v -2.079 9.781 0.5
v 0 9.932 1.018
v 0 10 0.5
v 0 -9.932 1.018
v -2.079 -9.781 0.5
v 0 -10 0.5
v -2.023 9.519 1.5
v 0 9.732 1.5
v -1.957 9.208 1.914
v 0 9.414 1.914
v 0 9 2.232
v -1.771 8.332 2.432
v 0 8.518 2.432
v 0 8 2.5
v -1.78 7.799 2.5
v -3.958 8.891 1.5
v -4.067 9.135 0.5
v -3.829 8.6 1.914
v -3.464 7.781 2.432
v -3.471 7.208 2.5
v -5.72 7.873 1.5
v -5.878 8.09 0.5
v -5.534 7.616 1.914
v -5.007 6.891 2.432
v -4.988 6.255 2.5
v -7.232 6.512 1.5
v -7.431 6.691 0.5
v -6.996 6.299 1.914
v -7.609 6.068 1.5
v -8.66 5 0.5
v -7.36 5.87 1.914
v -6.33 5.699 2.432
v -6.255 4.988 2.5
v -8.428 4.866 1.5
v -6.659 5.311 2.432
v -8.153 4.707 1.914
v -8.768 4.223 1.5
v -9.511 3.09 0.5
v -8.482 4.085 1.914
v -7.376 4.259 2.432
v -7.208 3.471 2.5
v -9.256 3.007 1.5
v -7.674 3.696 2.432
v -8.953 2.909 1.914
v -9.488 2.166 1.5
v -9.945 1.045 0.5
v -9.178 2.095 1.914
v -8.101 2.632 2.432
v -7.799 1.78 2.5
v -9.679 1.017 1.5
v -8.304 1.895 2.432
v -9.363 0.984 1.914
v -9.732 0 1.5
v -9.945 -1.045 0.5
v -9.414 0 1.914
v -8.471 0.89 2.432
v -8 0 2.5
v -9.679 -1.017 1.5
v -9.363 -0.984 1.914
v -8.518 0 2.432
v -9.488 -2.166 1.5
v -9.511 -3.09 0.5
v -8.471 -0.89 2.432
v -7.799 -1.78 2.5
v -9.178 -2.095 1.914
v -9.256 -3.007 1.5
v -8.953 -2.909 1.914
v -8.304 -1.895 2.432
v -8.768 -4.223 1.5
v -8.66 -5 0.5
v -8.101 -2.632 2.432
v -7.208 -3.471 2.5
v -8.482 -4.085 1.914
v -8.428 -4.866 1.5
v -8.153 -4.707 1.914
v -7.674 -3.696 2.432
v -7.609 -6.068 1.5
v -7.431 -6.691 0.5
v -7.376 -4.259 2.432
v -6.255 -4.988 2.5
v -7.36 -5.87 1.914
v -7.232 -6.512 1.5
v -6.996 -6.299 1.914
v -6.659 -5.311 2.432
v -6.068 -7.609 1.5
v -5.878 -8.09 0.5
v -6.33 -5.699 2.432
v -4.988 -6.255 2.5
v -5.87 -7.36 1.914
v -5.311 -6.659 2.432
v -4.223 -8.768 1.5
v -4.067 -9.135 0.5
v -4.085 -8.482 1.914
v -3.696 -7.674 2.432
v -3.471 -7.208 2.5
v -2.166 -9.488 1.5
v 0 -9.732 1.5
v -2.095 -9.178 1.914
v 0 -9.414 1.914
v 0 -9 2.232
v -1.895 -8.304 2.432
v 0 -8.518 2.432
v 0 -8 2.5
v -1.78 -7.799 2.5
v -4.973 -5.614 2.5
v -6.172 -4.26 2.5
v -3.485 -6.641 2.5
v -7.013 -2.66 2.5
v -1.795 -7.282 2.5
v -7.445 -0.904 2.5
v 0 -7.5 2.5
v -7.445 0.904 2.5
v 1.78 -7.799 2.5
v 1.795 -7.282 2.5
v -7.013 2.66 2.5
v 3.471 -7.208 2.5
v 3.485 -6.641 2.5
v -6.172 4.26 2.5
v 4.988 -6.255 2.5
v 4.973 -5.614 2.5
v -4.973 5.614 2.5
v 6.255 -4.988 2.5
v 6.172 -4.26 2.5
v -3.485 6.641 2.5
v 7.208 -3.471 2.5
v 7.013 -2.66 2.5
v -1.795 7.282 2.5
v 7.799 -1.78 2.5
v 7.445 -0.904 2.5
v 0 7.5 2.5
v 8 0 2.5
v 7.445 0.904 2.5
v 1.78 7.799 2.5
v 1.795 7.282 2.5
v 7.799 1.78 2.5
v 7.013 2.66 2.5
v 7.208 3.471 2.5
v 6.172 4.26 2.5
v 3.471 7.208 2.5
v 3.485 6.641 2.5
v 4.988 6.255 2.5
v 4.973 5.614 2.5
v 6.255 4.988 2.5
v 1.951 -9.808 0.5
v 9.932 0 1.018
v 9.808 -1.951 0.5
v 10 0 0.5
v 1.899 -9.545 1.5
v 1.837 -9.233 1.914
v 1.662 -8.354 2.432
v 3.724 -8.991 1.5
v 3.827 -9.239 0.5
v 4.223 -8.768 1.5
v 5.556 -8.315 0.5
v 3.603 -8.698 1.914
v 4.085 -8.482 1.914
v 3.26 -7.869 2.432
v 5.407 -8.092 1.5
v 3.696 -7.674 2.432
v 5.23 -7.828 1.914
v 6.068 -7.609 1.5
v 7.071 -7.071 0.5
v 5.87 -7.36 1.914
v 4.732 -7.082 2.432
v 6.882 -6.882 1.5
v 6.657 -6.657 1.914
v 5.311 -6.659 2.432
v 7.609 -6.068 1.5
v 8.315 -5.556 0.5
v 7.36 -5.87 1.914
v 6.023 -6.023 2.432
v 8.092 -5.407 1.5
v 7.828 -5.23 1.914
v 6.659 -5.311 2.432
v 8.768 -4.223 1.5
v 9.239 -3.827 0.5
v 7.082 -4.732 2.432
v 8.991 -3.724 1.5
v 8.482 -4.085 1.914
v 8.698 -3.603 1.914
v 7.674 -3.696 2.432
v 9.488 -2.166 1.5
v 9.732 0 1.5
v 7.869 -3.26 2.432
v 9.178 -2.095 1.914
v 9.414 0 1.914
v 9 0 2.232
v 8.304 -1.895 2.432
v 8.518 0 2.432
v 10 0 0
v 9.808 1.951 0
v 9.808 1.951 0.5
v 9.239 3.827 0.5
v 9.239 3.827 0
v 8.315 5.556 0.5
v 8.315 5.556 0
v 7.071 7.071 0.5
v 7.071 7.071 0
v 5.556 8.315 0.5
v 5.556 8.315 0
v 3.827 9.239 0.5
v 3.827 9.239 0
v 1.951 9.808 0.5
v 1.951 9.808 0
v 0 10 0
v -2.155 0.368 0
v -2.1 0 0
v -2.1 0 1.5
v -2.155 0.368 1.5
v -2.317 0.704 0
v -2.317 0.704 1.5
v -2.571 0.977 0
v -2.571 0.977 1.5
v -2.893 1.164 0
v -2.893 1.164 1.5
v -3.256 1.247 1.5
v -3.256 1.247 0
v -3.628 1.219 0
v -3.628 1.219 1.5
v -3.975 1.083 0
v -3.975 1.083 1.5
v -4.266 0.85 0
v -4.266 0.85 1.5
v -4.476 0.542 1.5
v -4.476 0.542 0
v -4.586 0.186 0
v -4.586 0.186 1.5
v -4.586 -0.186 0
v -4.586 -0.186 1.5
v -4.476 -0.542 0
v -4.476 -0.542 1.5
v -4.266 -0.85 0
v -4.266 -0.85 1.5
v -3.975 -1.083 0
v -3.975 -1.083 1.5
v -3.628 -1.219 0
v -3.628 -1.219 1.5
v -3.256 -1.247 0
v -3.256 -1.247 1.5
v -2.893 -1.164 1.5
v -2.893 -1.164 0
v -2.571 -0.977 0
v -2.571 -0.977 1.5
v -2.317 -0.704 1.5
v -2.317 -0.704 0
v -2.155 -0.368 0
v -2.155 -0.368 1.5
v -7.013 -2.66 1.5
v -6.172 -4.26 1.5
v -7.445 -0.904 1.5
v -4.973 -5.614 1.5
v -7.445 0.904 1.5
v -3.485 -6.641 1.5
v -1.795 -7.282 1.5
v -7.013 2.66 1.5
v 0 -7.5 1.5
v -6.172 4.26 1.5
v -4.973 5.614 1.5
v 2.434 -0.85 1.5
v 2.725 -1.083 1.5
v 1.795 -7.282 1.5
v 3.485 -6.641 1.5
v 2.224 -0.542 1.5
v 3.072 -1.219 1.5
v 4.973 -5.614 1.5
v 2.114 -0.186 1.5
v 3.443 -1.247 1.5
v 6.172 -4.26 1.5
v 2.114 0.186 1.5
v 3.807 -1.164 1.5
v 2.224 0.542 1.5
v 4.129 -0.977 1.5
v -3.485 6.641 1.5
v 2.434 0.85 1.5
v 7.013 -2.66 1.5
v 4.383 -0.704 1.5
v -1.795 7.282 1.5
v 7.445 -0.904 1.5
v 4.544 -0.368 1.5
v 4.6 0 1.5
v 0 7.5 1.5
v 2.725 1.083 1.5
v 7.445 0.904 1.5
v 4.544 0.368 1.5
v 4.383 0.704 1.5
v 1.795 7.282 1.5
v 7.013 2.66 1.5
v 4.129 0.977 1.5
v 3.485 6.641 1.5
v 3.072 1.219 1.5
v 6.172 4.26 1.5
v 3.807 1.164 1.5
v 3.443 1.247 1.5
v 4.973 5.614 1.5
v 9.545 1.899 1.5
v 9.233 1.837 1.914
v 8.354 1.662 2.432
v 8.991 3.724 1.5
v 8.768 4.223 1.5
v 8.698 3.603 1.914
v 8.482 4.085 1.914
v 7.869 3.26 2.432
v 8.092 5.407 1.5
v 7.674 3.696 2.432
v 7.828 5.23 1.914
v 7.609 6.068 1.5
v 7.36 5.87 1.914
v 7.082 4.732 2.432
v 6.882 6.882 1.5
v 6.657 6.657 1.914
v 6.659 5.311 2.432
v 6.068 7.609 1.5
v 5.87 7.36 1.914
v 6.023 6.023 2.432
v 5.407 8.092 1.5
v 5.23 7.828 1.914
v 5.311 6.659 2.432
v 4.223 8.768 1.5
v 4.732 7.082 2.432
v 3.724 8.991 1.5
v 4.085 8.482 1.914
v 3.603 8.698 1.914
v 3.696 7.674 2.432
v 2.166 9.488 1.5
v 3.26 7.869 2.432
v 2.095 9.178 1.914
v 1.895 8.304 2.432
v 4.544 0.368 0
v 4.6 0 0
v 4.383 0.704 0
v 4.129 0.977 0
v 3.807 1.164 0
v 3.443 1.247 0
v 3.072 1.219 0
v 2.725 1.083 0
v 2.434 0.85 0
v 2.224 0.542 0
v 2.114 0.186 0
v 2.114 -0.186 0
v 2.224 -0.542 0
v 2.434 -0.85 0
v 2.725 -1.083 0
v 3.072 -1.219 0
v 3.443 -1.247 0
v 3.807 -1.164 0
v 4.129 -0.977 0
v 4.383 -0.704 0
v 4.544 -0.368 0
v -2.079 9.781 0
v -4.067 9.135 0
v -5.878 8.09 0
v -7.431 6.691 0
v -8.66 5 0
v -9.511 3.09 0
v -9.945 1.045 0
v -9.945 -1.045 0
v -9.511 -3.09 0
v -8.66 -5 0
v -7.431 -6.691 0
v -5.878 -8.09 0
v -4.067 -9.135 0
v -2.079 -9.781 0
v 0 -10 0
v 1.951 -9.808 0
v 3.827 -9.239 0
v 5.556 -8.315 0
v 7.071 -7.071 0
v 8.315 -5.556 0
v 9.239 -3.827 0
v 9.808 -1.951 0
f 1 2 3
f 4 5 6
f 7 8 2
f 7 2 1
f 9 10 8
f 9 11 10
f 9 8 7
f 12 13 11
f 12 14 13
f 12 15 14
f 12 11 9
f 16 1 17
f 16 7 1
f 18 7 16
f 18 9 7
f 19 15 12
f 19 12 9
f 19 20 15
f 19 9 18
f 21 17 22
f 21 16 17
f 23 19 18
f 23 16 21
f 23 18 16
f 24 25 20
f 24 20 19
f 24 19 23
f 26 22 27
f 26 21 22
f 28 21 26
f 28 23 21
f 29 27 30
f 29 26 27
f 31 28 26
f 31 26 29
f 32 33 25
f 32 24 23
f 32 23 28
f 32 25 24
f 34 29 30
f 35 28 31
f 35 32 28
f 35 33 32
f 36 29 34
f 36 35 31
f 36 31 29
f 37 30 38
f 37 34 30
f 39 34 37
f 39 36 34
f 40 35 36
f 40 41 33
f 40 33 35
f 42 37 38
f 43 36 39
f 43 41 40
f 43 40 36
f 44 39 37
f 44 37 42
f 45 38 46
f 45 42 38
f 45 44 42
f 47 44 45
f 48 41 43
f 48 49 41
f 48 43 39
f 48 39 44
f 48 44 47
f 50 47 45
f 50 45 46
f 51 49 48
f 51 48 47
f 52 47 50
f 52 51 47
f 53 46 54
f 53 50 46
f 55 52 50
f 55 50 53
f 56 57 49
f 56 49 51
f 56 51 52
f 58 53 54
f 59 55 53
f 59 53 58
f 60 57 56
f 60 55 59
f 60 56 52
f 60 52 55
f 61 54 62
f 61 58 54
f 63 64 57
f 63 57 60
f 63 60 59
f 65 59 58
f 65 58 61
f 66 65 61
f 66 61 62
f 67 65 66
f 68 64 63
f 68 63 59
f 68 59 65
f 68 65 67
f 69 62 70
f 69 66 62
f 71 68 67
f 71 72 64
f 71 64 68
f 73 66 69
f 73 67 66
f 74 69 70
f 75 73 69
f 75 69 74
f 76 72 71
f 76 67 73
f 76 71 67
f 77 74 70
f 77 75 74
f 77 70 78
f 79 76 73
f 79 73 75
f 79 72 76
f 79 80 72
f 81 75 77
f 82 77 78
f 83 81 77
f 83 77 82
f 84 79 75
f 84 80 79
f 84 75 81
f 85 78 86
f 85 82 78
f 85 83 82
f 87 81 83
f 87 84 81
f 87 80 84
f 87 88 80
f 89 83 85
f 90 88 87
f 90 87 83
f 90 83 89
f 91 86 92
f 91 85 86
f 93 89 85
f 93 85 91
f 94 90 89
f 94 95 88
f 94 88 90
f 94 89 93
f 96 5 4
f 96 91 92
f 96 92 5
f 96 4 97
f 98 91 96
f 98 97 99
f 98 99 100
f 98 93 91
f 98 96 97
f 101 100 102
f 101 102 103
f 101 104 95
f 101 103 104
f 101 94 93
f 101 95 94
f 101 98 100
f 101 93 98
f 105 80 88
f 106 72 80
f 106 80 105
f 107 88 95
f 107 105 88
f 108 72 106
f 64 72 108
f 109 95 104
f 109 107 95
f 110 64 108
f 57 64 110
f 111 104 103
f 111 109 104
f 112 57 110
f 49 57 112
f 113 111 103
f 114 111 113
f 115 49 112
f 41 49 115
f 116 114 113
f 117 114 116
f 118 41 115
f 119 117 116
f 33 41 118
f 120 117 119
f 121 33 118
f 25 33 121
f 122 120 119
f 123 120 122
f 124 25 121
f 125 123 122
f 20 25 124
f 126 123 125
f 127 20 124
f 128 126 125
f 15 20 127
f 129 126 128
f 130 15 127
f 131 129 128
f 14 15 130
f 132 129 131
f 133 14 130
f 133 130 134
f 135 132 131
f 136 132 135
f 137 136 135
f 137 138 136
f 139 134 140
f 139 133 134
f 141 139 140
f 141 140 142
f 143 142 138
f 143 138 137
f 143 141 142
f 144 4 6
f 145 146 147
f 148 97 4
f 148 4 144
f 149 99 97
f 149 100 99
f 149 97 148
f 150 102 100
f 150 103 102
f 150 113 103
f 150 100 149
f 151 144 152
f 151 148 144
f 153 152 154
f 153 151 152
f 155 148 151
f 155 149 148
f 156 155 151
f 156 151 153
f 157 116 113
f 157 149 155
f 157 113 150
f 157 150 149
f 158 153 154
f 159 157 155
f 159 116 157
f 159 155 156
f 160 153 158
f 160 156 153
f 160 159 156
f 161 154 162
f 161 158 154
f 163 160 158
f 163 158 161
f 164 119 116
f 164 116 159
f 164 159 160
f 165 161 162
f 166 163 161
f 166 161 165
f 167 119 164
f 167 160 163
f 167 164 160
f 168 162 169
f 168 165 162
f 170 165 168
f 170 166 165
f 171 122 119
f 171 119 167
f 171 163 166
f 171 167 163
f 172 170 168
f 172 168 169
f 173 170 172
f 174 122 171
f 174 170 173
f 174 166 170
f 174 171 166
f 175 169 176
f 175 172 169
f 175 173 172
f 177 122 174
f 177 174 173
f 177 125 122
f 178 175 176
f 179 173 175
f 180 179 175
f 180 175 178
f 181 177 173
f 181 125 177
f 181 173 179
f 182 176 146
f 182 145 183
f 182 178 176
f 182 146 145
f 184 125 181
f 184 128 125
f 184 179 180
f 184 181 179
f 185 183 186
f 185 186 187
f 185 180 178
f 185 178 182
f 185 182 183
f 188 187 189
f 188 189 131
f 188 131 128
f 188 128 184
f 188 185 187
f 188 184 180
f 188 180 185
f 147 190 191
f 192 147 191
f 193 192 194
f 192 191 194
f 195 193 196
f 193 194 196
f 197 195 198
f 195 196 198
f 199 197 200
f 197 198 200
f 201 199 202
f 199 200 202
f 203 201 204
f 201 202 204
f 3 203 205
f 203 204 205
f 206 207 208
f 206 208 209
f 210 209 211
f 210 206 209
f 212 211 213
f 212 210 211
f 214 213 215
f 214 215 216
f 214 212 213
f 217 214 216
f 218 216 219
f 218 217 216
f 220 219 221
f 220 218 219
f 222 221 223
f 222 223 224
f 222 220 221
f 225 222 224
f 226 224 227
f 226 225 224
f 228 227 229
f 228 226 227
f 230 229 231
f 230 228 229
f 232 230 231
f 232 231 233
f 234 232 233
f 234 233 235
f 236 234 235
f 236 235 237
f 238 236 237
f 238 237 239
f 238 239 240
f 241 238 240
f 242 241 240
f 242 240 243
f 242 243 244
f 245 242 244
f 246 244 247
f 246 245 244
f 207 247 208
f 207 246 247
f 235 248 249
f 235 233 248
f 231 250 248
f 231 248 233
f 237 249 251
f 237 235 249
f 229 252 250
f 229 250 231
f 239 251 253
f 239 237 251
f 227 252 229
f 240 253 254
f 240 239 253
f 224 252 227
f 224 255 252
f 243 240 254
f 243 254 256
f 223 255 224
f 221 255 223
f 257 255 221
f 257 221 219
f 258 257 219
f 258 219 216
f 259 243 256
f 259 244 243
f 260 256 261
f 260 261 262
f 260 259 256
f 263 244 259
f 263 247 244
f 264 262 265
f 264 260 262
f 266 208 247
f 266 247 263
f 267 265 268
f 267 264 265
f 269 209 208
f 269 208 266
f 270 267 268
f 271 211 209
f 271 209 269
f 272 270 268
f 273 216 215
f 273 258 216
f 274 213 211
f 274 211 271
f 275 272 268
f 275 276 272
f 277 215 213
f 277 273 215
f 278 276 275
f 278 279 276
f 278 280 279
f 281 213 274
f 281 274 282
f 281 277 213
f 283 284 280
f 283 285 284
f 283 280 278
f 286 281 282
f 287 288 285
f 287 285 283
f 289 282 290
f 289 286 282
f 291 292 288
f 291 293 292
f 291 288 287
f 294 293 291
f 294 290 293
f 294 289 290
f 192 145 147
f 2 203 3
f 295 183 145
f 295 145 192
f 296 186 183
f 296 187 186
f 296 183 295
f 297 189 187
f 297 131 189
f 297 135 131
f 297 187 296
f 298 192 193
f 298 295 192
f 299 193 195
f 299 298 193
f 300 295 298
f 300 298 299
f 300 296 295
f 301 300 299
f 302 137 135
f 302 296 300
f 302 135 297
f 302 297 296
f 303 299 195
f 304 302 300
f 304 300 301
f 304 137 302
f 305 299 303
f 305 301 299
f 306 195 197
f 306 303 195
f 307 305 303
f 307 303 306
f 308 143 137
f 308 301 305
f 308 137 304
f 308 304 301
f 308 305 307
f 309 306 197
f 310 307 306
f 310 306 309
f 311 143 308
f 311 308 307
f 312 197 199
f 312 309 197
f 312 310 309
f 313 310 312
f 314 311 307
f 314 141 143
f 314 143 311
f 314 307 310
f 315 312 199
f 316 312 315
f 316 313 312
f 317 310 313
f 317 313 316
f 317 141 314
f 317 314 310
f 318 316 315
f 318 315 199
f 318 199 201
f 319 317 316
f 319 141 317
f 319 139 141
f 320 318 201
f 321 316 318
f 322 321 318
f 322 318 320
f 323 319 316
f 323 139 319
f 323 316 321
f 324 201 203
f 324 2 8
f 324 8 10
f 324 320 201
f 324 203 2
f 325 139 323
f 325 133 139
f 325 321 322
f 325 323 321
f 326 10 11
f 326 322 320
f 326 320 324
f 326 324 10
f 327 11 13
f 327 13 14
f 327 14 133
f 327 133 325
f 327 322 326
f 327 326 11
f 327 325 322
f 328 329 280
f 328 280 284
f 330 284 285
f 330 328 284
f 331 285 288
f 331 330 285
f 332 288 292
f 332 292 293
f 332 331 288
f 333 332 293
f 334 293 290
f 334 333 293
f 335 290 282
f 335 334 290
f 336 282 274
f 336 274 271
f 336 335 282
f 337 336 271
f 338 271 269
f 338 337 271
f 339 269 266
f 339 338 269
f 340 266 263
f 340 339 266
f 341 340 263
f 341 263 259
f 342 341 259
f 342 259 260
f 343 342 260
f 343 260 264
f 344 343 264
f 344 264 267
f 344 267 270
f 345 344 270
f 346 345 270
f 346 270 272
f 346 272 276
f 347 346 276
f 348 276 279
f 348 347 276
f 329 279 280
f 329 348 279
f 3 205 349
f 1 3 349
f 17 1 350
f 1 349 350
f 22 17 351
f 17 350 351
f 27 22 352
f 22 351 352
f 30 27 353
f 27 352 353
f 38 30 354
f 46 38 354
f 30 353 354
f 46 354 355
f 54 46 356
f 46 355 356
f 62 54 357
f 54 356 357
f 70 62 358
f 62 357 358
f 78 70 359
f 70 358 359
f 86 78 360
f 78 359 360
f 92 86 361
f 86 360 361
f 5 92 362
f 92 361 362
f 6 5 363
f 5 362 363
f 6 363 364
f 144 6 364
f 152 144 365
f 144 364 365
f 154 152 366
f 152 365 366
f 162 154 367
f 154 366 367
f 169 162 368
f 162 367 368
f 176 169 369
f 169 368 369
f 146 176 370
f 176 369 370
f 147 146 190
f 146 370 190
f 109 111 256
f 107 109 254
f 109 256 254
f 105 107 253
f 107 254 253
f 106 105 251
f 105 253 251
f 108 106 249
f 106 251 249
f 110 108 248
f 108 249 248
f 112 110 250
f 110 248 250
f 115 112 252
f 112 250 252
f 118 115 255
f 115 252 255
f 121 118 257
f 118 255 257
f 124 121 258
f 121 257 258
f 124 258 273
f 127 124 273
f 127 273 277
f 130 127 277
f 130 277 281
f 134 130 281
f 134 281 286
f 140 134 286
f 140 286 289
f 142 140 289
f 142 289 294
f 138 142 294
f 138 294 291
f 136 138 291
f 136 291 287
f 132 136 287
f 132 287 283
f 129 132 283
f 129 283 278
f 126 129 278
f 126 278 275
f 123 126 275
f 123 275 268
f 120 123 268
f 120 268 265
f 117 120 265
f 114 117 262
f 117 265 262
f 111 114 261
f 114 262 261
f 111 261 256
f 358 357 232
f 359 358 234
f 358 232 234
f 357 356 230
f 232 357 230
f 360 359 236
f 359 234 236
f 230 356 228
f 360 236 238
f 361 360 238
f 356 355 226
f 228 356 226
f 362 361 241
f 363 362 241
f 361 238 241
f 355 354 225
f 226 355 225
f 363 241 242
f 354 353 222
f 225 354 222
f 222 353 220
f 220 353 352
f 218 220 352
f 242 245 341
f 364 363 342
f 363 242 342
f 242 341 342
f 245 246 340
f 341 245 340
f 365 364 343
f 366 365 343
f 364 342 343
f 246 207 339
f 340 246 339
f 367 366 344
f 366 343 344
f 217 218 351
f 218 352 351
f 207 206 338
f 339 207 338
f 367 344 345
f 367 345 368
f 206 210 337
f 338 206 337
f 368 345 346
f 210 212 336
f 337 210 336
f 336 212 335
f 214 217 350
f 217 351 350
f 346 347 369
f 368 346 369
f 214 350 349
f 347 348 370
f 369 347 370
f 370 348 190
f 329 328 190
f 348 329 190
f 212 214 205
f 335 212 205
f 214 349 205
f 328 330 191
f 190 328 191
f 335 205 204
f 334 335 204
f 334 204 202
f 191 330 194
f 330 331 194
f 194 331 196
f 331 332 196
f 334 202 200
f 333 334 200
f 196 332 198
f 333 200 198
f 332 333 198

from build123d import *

# Parameters (mm, degrees)
F1_DEPTH = 2.5
F0_R     = 1.25
F2_DEPTH = 1.5
F3_R     = 2


with BuildPart() as f1:
    # F0 (on Top) → F1 (new body)
    with BuildSketch(Plane.XY):
        with BuildLine():
            ThreePointArc((0, 7.5), (5.3033008589, 5.3033008589), (7.5, 0))
            ThreePointArc((7.5, 0), (5.3033008589, -5.3033008589), (0, -7.5))
            Line((0, -7.5), (0, -10))
            ThreePointArc((0, -10), (7.0710678119, -7.0710678119), (10, 0))
            ThreePointArc((10, 0), (7.0710678119, 7.0710678119), (0, 10))
            Line((0, 10), (0, 7.5))
        make_face()
        with BuildLine():
            ThreePointArc((0, -7.5), (-7.5, 0), (0, 7.5))
            Line((0, 7.5), (0, 10))
            ThreePointArc((0, 10), (-10, 0), (0, -10))
            Line((0, -10), (0, -7.5))
        make_face()
    extrude(amount=F1_DEPTH)

    # F0 (on Top) → F2 (join)
    with BuildSketch(Plane.XY):
        with BuildLine():
            Line((0, -7.5), (0, 7.5))
            ThreePointArc((0, 7.5), (-7.5, 0), (0, -7.5))
        make_face()
        with Locations((-3.3498867415, 0)):
            Circle(F0_R, mode=Mode.SUBTRACT)
        with BuildLine():
            ThreePointArc((0, -7.5), (5.3033008589, -5.3033008589), (7.5, 0))
            ThreePointArc((7.5, 0), (5.3033008589, 5.3033008589), (0, 7.5))
            Line((0, 7.5), (0, -7.5))
        make_face()
        with Locations((3.3498867415, 0)):
            Circle(F0_R, mode=Mode.SUBTRACT)
    extrude(amount=F2_DEPTH)

    # F3
    f3_edges = [f1.edges().sort_by_distance(p)[0] for p in [
        (-10, 0, 2.5),
    ]]
    fillet(f3_edges, radius=F3_R)


solid = f1.part
